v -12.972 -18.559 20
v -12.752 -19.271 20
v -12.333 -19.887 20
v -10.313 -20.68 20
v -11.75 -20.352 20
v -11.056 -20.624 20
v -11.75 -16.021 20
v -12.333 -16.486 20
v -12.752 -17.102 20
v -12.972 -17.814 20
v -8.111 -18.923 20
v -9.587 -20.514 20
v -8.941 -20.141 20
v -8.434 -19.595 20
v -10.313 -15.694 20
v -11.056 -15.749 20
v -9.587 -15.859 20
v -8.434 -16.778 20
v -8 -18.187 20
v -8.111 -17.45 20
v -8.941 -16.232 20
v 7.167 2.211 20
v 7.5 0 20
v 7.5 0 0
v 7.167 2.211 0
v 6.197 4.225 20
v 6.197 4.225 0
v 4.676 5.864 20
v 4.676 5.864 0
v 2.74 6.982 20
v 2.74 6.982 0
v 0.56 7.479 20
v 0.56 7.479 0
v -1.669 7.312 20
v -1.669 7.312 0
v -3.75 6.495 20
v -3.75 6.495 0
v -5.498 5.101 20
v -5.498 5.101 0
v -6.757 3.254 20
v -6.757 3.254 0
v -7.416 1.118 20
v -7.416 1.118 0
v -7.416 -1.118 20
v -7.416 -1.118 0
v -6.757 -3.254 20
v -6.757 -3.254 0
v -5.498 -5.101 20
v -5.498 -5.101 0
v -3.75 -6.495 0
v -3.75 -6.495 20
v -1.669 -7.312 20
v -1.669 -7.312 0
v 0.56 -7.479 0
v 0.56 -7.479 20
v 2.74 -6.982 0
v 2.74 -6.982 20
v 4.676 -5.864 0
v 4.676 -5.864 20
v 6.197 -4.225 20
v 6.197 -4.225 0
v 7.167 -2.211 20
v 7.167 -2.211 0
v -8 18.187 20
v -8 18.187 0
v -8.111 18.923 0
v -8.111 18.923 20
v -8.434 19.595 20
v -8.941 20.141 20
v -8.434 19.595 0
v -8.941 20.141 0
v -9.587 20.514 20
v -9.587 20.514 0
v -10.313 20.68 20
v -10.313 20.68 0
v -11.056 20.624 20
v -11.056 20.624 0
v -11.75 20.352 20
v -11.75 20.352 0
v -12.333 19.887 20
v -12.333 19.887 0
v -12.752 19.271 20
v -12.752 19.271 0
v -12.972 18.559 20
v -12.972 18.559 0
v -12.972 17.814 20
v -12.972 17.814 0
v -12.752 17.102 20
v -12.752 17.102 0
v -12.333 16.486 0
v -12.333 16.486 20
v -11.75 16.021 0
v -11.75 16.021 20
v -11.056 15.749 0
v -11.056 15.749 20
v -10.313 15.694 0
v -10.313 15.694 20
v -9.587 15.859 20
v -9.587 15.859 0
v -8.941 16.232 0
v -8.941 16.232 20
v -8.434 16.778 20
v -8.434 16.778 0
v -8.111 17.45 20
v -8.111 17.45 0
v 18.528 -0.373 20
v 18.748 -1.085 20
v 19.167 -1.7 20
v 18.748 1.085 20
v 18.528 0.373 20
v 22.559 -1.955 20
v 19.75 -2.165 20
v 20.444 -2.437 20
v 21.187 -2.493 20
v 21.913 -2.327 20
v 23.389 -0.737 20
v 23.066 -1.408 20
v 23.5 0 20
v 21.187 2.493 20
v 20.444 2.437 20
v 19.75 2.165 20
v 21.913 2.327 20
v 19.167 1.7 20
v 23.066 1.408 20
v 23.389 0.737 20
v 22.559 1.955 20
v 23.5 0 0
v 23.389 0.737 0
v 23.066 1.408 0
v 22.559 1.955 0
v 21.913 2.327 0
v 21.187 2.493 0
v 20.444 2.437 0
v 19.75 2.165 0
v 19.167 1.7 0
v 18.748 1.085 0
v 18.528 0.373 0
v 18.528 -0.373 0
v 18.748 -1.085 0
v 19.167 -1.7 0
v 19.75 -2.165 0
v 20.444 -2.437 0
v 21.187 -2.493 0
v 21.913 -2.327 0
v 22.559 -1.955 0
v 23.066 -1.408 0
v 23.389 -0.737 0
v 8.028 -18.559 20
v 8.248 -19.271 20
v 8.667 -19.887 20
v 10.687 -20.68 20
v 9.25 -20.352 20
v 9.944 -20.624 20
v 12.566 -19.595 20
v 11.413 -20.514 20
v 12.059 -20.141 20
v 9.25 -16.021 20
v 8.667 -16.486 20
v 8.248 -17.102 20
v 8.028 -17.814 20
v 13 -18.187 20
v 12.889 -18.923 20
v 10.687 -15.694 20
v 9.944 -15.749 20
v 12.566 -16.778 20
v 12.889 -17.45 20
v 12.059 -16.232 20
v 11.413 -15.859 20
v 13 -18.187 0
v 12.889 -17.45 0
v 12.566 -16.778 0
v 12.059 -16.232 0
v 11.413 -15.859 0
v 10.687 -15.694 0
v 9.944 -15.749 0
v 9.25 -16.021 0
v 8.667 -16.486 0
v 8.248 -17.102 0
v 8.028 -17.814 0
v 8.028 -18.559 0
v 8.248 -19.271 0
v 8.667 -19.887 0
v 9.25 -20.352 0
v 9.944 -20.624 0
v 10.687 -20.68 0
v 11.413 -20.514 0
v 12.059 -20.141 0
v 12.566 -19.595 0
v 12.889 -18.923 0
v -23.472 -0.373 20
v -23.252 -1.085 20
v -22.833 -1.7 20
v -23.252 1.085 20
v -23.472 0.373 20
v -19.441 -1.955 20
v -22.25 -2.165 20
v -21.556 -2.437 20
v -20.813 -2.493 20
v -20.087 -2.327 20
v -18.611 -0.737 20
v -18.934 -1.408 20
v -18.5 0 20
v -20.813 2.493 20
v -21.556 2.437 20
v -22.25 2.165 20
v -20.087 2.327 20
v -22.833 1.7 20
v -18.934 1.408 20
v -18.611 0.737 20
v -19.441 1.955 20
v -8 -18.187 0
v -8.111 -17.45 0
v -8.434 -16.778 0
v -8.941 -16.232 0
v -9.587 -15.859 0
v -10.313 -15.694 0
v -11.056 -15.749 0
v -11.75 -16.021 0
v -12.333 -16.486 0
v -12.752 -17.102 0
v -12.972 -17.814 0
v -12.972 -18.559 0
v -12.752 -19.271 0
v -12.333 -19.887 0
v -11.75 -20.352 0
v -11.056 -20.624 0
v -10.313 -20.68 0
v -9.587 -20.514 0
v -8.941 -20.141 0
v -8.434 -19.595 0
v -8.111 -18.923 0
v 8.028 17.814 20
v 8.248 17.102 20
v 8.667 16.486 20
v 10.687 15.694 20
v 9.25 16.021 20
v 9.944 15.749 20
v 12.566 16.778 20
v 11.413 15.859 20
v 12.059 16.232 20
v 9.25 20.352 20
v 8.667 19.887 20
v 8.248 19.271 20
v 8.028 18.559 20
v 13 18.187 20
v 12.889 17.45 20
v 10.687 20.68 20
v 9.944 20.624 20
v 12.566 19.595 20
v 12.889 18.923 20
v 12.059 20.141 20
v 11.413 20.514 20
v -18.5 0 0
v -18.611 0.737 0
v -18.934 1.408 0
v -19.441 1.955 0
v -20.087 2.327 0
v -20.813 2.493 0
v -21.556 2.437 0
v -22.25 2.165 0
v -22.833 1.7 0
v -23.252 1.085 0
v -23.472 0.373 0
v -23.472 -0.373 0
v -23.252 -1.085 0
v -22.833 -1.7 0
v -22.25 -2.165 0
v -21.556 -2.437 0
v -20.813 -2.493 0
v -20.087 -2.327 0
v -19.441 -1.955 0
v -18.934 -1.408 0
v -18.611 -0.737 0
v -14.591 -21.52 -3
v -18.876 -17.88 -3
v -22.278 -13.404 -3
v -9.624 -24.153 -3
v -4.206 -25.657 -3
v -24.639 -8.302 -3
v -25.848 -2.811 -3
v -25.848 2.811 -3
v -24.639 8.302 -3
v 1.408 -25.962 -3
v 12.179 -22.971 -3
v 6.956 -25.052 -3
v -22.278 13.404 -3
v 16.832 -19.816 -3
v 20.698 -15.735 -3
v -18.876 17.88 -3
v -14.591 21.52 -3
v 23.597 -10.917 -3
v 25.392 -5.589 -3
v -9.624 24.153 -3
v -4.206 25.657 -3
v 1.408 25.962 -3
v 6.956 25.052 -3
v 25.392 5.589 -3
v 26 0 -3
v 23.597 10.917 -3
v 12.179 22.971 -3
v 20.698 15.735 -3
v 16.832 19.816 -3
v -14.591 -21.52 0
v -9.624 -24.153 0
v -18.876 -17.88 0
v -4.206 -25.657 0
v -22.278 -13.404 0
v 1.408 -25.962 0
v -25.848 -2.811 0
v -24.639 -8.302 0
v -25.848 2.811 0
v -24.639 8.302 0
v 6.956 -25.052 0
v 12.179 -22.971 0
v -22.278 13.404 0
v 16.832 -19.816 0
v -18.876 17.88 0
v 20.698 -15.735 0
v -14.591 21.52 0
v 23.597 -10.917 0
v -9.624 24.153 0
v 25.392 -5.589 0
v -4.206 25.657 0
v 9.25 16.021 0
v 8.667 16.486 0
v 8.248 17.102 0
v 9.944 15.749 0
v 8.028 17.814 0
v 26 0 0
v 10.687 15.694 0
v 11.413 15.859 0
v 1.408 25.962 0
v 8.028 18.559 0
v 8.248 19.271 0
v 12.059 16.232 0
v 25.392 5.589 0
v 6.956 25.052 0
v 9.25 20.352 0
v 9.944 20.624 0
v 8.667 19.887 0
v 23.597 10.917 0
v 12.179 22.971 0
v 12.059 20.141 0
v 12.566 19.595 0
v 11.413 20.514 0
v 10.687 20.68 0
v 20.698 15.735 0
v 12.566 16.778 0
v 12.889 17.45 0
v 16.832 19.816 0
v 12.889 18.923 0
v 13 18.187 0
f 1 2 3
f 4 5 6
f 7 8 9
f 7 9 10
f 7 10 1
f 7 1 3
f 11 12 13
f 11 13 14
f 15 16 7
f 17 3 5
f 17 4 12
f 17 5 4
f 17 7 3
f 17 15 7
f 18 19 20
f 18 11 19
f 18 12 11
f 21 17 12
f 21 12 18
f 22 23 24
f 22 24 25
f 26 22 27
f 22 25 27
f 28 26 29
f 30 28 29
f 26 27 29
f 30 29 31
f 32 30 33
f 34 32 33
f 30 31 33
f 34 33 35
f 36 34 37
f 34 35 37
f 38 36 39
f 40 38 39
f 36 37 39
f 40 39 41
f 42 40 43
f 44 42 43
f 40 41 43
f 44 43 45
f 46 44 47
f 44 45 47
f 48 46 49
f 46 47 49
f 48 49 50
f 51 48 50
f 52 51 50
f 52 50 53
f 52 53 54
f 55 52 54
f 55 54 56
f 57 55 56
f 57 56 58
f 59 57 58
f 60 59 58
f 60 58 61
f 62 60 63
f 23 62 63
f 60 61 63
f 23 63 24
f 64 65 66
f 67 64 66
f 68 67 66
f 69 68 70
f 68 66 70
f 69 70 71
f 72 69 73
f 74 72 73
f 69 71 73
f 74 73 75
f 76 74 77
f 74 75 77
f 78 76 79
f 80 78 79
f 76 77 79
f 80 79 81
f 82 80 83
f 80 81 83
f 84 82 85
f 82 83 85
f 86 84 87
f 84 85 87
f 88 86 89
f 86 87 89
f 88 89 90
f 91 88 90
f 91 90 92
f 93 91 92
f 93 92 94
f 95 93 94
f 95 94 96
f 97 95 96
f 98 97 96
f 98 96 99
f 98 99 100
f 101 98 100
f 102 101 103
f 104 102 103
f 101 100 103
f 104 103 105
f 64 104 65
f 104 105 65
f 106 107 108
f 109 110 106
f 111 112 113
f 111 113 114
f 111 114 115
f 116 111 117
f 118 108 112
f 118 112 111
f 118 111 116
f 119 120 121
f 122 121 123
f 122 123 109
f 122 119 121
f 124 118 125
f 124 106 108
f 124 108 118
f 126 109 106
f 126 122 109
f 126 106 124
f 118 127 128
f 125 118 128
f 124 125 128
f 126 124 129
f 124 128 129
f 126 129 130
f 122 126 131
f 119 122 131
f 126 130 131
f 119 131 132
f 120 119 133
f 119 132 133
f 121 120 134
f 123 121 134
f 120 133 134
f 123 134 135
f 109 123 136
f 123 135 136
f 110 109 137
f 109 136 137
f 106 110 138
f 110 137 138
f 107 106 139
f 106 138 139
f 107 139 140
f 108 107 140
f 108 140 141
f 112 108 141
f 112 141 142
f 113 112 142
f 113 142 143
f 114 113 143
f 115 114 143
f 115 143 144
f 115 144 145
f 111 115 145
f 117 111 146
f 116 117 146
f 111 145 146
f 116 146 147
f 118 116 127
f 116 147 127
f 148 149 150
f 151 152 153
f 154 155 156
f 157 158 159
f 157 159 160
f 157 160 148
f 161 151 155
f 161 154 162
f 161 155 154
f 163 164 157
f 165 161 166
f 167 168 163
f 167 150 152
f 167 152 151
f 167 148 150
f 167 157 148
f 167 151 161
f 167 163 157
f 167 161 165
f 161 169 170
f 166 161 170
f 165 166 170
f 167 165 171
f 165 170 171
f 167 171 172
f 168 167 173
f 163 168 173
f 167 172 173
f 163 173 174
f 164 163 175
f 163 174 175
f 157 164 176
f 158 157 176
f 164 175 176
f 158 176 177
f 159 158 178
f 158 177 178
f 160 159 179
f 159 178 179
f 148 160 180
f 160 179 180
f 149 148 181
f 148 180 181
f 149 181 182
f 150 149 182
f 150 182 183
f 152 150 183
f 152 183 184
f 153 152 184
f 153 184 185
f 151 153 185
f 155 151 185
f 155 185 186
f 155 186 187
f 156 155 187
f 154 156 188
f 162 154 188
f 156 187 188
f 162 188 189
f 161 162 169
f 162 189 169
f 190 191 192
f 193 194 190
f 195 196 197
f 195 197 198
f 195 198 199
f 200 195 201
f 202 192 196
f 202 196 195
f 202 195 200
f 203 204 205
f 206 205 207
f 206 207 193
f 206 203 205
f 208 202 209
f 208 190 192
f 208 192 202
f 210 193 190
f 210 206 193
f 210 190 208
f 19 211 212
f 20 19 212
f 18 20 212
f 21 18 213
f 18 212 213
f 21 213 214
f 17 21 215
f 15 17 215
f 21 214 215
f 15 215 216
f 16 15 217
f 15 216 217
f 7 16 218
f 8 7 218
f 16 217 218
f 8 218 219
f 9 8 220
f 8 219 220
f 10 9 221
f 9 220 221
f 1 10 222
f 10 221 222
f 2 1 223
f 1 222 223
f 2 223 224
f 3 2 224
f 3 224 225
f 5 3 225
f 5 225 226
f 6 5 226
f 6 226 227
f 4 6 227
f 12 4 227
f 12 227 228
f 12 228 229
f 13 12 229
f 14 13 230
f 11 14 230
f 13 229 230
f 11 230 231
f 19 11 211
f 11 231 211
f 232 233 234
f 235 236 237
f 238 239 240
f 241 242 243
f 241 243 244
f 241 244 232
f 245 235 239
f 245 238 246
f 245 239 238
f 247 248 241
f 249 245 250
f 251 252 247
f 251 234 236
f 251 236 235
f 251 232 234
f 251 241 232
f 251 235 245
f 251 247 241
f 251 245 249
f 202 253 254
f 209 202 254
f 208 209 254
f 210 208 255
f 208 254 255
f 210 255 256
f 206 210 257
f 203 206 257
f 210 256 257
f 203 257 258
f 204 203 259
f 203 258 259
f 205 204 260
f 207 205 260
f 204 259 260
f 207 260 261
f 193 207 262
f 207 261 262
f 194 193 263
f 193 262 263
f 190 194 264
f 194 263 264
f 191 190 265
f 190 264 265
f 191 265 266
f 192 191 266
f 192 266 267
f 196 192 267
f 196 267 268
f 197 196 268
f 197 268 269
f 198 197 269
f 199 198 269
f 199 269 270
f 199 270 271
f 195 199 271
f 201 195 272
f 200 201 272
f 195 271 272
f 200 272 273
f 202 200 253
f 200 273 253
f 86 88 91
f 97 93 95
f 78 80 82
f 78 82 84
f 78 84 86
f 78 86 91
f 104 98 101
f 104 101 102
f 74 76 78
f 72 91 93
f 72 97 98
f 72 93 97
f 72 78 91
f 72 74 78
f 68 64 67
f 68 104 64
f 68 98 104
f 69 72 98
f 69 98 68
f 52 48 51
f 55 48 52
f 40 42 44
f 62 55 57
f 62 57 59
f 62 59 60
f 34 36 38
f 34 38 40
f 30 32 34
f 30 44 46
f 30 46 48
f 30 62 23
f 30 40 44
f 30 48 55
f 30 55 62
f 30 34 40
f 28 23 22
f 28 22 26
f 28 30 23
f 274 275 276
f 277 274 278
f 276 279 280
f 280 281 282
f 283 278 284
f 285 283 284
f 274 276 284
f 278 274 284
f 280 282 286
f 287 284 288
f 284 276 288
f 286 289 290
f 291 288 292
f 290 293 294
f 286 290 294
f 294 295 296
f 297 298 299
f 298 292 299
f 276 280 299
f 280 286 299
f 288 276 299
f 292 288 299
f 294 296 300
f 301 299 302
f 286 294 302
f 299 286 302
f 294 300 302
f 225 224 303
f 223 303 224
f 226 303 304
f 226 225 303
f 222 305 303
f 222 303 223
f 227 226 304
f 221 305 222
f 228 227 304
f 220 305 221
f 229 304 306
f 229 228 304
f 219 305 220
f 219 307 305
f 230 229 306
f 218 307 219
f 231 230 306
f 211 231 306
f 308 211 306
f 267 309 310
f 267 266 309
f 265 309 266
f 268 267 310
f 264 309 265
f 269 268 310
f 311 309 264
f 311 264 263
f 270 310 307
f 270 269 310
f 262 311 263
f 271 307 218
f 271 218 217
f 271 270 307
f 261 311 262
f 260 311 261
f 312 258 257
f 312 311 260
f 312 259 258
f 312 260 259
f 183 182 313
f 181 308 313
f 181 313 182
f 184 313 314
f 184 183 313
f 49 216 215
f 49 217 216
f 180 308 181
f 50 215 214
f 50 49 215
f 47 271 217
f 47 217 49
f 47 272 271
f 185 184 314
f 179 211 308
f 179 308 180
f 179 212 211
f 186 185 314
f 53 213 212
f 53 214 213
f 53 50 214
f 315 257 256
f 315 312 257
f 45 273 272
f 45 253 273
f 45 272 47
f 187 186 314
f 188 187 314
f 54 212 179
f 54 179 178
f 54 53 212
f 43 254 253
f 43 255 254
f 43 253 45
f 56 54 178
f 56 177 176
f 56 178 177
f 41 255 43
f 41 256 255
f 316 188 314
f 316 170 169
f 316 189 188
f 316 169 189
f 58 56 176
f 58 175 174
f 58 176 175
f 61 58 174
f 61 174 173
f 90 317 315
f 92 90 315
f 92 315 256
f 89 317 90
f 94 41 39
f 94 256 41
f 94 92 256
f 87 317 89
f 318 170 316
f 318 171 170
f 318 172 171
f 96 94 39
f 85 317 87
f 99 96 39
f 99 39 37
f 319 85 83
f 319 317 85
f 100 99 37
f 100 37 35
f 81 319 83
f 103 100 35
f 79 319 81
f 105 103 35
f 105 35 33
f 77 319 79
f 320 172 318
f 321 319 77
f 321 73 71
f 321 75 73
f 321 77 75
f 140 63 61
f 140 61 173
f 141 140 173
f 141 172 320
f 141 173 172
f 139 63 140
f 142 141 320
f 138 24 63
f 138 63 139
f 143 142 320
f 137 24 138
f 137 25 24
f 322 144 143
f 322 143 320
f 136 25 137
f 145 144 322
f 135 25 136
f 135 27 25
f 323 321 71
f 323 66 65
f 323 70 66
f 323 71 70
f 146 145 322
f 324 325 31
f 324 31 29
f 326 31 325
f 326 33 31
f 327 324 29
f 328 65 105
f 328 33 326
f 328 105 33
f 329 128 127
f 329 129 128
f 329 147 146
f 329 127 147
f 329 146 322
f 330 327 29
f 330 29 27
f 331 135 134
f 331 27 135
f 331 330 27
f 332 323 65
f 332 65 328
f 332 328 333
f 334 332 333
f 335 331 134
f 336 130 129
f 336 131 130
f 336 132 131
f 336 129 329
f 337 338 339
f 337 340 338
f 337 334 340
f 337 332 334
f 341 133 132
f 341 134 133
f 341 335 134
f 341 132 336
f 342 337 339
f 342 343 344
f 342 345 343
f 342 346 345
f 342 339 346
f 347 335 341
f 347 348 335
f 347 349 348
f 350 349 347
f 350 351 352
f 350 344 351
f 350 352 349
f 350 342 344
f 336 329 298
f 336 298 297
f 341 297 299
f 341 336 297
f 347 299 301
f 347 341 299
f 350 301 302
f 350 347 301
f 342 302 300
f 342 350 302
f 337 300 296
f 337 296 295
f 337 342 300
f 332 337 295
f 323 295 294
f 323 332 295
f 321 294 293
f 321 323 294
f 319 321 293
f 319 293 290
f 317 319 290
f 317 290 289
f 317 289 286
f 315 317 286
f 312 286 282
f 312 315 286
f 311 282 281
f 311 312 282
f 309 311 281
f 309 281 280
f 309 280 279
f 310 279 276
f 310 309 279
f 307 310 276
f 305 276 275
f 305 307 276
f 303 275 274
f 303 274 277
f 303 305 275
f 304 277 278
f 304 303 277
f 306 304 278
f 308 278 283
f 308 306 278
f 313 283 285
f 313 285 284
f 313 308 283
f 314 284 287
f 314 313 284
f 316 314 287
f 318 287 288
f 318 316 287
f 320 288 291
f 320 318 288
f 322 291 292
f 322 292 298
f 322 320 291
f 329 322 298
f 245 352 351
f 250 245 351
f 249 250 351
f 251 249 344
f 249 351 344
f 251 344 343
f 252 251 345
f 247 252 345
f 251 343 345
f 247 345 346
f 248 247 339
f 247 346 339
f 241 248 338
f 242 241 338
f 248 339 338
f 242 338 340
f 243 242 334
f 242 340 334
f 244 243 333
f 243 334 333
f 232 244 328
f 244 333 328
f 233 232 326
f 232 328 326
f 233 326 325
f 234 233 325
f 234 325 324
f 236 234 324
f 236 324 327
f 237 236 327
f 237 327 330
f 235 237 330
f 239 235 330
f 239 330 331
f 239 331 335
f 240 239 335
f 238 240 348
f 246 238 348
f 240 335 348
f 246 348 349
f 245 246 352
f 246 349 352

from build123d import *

# Parameters (mm, degrees)
SKETCH_1_R      = 26
EXTRUDE_1_DEPTH = 3
SKETCH_2_R      = 2.5
EXTRUDE_2_DEPTH = 20
SKETCH_3_R      = 7.5
EXTRUDE_3_DEPTH = 20


with BuildPart() as part:
    # 草图1 → 凸台-拉伸1 (new body)
    with BuildSketch(Plane.XY):
        Circle(SKETCH_1_R)
    extrude(amount=-EXTRUDE_1_DEPTH)

    # 草图2 → 凸台-拉伸2 (add)
    with BuildSketch(Plane.XY):
        with Locations((-21, 0)):
            Circle(SKETCH_2_R)
        with Locations((-10.5, 18.186533479)):
            Circle(SKETCH_2_R)
        with Locations((10.5, 18.186533479)):
            Circle(SKETCH_2_R)
        with Locations((21, 0)):
            Circle(SKETCH_2_R)
        with Locations((10.5, -18.186533479)):
            Circle(SKETCH_2_R)
        with Locations((-10.5, -18.186533479)):
            Circle(SKETCH_2_R)
    extrude(amount=EXTRUDE_2_DEPTH)

    # 草图3 → 凸台-拉伸3 (add)
    with BuildSketch(Plane.XY):
        Circle(SKETCH_3_R)
    extrude(amount=EXTRUDE_3_DEPTH)


solid = part.part
